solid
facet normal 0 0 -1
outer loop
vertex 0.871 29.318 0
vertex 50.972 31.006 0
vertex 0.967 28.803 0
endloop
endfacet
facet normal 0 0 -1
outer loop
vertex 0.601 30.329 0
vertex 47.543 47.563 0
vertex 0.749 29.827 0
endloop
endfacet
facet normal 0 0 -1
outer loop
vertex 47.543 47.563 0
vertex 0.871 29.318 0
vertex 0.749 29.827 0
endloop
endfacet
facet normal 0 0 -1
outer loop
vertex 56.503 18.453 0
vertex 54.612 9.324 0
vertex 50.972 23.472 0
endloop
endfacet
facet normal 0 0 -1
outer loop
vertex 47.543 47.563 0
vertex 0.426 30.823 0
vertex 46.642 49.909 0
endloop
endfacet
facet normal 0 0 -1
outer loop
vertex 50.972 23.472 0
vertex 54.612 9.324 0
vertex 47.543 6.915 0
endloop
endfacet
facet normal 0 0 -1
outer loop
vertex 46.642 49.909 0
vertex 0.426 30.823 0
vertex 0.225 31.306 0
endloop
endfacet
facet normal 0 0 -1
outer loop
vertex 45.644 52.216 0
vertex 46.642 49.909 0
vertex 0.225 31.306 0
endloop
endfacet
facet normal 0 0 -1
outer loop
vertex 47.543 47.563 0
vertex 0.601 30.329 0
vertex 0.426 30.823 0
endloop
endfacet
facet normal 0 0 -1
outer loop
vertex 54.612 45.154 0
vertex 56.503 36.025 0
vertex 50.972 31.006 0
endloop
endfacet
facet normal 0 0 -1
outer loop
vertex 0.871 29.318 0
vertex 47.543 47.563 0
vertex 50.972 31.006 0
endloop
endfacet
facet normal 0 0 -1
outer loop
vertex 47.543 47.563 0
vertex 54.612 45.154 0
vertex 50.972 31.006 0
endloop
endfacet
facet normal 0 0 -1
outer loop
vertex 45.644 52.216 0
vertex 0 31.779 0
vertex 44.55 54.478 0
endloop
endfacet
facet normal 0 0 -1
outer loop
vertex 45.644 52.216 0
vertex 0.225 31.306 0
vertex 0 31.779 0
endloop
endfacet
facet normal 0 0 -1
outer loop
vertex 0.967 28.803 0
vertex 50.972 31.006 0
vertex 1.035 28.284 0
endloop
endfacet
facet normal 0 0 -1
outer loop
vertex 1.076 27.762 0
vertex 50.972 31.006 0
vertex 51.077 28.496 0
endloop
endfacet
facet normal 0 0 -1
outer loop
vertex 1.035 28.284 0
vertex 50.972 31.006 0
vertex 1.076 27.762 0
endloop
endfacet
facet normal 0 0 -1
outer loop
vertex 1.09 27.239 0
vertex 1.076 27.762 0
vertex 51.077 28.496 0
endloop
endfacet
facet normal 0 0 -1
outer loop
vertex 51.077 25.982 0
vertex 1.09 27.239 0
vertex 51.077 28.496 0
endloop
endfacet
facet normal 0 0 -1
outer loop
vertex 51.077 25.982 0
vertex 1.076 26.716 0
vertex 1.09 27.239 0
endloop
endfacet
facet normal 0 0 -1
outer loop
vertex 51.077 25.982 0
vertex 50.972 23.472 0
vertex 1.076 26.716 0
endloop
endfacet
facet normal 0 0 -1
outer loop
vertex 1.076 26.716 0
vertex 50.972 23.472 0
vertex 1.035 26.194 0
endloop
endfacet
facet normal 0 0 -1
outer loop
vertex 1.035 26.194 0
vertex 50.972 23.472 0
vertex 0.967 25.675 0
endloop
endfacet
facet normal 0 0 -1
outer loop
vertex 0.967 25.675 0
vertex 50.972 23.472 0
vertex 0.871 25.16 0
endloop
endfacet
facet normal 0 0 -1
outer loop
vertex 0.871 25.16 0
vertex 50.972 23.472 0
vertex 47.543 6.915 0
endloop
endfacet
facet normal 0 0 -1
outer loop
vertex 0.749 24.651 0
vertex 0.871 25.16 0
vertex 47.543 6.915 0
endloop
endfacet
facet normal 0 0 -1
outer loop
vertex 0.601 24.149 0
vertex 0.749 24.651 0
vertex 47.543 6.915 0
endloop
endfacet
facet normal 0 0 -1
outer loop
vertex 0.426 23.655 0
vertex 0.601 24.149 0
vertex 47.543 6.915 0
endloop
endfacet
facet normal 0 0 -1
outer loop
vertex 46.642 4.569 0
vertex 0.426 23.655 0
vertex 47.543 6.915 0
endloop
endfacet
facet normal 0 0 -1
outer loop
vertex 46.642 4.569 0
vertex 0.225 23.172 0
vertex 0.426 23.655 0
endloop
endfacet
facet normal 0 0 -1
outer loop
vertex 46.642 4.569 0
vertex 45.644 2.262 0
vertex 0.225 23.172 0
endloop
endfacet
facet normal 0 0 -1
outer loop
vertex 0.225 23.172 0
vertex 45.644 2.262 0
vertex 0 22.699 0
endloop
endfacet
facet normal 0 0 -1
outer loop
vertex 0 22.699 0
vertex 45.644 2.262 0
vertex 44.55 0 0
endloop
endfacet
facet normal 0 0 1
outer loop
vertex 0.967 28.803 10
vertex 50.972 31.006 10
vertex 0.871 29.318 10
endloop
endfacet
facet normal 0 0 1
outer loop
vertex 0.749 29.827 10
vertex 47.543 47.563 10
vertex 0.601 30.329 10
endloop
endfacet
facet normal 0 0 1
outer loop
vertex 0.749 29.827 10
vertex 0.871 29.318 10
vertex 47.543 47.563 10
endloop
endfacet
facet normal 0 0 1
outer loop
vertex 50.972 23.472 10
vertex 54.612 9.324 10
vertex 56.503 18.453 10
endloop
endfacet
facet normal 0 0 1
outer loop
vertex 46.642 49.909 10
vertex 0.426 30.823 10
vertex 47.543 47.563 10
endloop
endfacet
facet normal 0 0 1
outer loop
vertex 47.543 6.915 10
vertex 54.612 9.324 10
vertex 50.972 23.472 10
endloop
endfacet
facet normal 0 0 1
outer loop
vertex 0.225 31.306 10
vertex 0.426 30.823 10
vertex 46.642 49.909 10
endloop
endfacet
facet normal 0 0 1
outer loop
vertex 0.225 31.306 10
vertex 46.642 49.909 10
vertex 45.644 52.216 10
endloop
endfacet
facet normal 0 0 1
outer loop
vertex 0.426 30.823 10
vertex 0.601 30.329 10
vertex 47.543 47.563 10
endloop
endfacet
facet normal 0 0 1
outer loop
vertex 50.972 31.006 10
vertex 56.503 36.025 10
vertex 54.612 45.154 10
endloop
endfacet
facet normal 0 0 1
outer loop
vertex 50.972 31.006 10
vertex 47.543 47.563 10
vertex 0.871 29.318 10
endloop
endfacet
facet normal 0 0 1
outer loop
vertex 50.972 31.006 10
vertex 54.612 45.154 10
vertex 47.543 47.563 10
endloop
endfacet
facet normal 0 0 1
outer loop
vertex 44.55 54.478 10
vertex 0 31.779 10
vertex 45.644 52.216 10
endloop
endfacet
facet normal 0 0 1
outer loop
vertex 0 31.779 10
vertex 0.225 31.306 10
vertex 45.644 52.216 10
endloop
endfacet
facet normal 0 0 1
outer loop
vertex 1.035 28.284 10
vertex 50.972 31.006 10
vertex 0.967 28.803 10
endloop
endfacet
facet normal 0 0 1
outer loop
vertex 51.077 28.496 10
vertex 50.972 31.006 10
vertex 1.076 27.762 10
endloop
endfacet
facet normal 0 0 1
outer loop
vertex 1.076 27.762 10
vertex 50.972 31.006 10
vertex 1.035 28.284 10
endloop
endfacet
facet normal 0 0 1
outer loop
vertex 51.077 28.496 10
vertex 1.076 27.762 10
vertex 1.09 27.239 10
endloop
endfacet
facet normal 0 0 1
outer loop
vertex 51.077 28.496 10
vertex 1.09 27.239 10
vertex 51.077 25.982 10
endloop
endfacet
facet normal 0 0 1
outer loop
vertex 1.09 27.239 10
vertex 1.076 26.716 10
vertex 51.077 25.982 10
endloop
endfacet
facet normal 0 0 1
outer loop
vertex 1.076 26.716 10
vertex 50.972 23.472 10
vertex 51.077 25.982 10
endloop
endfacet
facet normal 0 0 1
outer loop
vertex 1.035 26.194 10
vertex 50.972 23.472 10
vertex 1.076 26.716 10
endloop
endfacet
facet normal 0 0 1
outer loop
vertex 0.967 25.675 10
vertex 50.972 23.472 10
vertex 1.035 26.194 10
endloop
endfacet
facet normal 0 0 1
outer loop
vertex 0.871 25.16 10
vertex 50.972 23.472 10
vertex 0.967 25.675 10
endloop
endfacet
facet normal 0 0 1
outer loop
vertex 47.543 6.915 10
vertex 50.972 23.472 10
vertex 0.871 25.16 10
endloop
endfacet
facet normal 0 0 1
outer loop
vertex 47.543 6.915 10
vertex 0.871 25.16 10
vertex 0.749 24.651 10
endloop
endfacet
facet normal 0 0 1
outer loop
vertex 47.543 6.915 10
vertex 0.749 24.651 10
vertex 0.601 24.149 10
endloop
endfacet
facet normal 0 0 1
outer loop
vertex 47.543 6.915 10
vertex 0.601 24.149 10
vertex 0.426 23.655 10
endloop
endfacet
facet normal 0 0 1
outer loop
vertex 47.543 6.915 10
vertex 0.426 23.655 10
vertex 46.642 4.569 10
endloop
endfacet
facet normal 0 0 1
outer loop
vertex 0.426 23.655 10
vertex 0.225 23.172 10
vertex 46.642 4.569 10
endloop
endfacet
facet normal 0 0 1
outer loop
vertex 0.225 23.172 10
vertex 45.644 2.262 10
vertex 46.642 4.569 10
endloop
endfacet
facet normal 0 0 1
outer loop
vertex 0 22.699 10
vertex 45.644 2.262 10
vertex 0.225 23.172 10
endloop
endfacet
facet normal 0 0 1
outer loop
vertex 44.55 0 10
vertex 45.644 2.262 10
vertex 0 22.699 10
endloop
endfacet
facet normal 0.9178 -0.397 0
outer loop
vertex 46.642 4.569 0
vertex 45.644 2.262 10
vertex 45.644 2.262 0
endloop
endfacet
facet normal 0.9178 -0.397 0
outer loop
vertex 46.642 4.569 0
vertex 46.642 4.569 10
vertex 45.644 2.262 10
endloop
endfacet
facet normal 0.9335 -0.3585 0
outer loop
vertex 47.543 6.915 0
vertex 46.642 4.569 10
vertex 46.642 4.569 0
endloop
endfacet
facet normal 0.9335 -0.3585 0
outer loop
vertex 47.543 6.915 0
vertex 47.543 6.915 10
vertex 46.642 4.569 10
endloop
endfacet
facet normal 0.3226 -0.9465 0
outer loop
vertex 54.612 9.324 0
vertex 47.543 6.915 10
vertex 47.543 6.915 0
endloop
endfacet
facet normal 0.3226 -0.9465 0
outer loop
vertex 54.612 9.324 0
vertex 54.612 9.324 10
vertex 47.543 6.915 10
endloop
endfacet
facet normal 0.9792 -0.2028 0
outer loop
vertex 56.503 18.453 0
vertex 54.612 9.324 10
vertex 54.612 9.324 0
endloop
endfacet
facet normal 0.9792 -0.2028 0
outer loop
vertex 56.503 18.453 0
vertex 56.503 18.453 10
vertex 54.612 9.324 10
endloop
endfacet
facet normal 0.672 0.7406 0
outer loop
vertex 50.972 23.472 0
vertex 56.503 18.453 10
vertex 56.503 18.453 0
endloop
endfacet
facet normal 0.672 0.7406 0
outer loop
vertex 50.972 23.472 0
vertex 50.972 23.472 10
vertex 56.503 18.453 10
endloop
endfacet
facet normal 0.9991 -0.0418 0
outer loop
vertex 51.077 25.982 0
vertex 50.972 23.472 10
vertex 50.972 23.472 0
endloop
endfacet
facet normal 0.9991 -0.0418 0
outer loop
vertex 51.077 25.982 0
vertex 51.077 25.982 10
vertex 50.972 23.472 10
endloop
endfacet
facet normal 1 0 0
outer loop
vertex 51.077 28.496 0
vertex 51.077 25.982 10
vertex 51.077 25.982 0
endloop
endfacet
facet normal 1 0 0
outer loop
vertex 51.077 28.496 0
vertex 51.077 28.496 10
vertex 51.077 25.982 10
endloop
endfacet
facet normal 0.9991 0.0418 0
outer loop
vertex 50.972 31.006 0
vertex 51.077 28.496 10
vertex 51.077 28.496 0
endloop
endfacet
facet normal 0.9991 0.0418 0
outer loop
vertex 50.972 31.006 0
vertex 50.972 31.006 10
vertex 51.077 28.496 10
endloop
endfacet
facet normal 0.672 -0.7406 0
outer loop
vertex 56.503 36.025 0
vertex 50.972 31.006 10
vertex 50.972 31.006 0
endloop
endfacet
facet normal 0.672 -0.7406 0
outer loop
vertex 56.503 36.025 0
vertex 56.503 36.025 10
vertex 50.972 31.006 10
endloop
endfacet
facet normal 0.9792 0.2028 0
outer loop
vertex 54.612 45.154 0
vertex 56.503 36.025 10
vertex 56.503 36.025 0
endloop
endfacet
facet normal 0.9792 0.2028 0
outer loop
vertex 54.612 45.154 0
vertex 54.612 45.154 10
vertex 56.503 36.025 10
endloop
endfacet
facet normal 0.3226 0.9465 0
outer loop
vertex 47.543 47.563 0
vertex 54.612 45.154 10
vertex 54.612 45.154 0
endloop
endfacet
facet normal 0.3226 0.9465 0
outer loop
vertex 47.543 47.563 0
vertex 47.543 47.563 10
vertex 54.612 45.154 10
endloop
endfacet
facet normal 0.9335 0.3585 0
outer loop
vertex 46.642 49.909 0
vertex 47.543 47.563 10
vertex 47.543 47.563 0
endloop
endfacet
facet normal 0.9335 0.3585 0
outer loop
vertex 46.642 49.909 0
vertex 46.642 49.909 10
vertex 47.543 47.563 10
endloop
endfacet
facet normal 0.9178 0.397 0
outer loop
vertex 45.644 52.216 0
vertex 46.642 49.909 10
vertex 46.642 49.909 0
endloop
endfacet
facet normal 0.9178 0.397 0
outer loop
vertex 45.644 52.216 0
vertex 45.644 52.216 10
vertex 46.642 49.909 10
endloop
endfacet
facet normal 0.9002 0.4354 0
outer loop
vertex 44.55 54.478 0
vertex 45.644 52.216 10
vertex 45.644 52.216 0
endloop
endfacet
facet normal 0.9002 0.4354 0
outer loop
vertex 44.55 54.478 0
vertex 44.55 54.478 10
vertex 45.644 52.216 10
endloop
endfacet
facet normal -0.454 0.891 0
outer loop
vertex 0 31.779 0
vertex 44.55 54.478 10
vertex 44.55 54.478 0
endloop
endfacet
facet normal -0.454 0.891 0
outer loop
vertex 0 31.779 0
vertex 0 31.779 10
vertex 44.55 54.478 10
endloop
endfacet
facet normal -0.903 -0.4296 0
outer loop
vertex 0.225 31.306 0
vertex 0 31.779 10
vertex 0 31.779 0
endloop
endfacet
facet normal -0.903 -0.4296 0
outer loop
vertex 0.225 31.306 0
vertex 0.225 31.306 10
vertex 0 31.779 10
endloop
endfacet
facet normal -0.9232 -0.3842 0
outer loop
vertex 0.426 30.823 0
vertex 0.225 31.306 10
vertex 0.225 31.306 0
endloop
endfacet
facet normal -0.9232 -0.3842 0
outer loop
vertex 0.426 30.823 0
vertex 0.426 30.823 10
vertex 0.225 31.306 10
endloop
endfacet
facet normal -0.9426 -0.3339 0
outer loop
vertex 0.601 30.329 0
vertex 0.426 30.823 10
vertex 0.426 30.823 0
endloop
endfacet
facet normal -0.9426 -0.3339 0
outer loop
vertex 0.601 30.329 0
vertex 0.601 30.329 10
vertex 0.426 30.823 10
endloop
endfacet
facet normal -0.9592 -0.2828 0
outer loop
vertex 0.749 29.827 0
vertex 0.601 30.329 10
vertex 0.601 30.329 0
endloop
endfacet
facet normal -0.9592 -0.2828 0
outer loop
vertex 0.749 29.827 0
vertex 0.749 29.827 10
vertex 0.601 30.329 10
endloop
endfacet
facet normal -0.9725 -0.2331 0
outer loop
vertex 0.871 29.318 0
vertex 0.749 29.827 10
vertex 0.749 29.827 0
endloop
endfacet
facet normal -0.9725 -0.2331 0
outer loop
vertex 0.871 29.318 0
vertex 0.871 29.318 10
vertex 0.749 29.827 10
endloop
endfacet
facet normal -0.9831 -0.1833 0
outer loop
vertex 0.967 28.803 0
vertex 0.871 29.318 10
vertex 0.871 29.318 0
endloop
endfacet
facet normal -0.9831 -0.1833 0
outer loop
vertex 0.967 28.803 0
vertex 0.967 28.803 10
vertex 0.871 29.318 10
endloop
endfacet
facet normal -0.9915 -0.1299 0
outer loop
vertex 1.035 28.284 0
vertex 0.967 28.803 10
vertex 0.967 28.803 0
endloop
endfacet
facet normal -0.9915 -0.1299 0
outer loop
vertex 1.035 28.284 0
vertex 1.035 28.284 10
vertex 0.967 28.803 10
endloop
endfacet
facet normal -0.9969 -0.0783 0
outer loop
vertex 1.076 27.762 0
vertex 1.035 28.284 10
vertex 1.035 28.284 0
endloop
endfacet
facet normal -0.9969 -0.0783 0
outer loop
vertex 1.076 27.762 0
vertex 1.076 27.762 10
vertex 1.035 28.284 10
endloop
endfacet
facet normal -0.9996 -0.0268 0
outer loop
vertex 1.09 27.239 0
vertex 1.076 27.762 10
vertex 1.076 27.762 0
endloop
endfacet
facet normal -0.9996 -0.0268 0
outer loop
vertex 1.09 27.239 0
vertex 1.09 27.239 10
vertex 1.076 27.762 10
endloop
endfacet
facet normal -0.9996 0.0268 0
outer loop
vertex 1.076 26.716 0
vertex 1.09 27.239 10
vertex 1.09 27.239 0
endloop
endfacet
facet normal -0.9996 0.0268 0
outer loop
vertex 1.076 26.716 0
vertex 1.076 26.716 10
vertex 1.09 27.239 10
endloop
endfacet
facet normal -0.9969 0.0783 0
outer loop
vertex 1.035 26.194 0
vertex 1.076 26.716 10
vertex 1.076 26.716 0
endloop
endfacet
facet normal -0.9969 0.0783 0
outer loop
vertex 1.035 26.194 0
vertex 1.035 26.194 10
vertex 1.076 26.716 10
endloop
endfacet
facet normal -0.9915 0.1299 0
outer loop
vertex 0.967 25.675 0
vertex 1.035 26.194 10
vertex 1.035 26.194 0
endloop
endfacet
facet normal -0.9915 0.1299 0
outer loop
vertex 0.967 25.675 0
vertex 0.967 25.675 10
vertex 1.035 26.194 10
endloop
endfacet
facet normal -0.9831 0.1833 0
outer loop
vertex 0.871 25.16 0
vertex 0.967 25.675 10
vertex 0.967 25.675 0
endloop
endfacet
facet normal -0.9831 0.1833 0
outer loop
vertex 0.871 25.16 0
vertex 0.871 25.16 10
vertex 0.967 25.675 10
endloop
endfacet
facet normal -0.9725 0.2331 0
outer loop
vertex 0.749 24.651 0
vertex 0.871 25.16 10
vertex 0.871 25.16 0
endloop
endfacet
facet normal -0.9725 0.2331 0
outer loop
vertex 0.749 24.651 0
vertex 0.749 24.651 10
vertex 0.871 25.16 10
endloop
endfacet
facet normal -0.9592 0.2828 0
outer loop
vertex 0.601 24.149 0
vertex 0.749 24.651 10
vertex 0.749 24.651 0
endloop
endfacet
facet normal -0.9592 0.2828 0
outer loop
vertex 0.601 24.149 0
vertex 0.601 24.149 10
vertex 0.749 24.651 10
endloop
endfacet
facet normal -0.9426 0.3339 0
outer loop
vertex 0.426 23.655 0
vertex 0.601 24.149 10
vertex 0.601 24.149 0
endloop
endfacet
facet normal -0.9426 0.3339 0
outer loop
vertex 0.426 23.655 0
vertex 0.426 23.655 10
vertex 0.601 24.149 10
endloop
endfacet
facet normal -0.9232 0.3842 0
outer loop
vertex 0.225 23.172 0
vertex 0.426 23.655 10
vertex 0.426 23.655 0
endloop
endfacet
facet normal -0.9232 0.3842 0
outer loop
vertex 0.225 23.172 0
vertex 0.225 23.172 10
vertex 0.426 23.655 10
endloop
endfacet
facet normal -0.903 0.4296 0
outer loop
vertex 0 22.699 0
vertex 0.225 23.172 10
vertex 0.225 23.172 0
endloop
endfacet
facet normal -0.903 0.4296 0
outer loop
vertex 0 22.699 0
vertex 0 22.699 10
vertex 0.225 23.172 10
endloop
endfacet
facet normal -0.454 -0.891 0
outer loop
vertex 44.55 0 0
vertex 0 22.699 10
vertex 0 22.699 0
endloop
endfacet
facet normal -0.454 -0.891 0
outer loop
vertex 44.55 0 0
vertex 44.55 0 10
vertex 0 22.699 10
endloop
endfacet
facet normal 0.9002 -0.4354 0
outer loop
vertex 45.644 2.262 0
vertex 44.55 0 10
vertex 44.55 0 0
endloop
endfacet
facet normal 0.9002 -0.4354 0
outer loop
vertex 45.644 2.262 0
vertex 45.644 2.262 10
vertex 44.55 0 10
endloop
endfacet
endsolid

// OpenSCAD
$fn = 32;

// ----------------------------------------------------------------------
// Gear sector: 2 teeth on 54 degrees
// ----------------------------------------------------------------------

// --- parameters (mm) ---
sector_angle = 54;        // sector angle, degrees
root_r = 60;              // root circle radius
tooth_h = 6;              // tooth height over the root circle
teeth = 2;                // number of teeth on the sector
hub_r = 10;               // hub bore radius
plate_t = 10;             // sector thickness, Z
arc_step = 3;             // sampling step of the root/hub arcs, degrees

tip_r = root_r + tooth_h;  // tip circle radius

profile = [[44.55, 0], [45.644, 2.262], [46.642, 4.569], [47.543, 6.915], [54.612, 9.324], [56.503, 18.453], [50.972, 23.472], [51.077, 25.982], [51.077, 28.496], [50.972, 31.006], [56.503, 36.025], [54.612, 45.154], [47.543, 47.563], [46.642, 49.909], [45.644, 52.216], [44.55, 54.478], [0, 31.779], [0.225, 31.306], [0.426, 30.823], [0.601, 30.329], [0.749, 29.827], [0.871, 29.318], [0.967, 28.803], [1.035, 28.284], [1.076, 27.762], [1.09, 27.239], [1.076, 26.716], [1.035, 26.194], [0.967, 25.675], [0.871, 25.16], [0.749, 24.651], [0.601, 24.149], [0.426, 23.655], [0.225, 23.172], [0, 22.699]];  // primary outline, 35 points, counter clockwise

// --- the one profile operation ---
linear_extrude(height = plate_t) polygon(points = profile);
